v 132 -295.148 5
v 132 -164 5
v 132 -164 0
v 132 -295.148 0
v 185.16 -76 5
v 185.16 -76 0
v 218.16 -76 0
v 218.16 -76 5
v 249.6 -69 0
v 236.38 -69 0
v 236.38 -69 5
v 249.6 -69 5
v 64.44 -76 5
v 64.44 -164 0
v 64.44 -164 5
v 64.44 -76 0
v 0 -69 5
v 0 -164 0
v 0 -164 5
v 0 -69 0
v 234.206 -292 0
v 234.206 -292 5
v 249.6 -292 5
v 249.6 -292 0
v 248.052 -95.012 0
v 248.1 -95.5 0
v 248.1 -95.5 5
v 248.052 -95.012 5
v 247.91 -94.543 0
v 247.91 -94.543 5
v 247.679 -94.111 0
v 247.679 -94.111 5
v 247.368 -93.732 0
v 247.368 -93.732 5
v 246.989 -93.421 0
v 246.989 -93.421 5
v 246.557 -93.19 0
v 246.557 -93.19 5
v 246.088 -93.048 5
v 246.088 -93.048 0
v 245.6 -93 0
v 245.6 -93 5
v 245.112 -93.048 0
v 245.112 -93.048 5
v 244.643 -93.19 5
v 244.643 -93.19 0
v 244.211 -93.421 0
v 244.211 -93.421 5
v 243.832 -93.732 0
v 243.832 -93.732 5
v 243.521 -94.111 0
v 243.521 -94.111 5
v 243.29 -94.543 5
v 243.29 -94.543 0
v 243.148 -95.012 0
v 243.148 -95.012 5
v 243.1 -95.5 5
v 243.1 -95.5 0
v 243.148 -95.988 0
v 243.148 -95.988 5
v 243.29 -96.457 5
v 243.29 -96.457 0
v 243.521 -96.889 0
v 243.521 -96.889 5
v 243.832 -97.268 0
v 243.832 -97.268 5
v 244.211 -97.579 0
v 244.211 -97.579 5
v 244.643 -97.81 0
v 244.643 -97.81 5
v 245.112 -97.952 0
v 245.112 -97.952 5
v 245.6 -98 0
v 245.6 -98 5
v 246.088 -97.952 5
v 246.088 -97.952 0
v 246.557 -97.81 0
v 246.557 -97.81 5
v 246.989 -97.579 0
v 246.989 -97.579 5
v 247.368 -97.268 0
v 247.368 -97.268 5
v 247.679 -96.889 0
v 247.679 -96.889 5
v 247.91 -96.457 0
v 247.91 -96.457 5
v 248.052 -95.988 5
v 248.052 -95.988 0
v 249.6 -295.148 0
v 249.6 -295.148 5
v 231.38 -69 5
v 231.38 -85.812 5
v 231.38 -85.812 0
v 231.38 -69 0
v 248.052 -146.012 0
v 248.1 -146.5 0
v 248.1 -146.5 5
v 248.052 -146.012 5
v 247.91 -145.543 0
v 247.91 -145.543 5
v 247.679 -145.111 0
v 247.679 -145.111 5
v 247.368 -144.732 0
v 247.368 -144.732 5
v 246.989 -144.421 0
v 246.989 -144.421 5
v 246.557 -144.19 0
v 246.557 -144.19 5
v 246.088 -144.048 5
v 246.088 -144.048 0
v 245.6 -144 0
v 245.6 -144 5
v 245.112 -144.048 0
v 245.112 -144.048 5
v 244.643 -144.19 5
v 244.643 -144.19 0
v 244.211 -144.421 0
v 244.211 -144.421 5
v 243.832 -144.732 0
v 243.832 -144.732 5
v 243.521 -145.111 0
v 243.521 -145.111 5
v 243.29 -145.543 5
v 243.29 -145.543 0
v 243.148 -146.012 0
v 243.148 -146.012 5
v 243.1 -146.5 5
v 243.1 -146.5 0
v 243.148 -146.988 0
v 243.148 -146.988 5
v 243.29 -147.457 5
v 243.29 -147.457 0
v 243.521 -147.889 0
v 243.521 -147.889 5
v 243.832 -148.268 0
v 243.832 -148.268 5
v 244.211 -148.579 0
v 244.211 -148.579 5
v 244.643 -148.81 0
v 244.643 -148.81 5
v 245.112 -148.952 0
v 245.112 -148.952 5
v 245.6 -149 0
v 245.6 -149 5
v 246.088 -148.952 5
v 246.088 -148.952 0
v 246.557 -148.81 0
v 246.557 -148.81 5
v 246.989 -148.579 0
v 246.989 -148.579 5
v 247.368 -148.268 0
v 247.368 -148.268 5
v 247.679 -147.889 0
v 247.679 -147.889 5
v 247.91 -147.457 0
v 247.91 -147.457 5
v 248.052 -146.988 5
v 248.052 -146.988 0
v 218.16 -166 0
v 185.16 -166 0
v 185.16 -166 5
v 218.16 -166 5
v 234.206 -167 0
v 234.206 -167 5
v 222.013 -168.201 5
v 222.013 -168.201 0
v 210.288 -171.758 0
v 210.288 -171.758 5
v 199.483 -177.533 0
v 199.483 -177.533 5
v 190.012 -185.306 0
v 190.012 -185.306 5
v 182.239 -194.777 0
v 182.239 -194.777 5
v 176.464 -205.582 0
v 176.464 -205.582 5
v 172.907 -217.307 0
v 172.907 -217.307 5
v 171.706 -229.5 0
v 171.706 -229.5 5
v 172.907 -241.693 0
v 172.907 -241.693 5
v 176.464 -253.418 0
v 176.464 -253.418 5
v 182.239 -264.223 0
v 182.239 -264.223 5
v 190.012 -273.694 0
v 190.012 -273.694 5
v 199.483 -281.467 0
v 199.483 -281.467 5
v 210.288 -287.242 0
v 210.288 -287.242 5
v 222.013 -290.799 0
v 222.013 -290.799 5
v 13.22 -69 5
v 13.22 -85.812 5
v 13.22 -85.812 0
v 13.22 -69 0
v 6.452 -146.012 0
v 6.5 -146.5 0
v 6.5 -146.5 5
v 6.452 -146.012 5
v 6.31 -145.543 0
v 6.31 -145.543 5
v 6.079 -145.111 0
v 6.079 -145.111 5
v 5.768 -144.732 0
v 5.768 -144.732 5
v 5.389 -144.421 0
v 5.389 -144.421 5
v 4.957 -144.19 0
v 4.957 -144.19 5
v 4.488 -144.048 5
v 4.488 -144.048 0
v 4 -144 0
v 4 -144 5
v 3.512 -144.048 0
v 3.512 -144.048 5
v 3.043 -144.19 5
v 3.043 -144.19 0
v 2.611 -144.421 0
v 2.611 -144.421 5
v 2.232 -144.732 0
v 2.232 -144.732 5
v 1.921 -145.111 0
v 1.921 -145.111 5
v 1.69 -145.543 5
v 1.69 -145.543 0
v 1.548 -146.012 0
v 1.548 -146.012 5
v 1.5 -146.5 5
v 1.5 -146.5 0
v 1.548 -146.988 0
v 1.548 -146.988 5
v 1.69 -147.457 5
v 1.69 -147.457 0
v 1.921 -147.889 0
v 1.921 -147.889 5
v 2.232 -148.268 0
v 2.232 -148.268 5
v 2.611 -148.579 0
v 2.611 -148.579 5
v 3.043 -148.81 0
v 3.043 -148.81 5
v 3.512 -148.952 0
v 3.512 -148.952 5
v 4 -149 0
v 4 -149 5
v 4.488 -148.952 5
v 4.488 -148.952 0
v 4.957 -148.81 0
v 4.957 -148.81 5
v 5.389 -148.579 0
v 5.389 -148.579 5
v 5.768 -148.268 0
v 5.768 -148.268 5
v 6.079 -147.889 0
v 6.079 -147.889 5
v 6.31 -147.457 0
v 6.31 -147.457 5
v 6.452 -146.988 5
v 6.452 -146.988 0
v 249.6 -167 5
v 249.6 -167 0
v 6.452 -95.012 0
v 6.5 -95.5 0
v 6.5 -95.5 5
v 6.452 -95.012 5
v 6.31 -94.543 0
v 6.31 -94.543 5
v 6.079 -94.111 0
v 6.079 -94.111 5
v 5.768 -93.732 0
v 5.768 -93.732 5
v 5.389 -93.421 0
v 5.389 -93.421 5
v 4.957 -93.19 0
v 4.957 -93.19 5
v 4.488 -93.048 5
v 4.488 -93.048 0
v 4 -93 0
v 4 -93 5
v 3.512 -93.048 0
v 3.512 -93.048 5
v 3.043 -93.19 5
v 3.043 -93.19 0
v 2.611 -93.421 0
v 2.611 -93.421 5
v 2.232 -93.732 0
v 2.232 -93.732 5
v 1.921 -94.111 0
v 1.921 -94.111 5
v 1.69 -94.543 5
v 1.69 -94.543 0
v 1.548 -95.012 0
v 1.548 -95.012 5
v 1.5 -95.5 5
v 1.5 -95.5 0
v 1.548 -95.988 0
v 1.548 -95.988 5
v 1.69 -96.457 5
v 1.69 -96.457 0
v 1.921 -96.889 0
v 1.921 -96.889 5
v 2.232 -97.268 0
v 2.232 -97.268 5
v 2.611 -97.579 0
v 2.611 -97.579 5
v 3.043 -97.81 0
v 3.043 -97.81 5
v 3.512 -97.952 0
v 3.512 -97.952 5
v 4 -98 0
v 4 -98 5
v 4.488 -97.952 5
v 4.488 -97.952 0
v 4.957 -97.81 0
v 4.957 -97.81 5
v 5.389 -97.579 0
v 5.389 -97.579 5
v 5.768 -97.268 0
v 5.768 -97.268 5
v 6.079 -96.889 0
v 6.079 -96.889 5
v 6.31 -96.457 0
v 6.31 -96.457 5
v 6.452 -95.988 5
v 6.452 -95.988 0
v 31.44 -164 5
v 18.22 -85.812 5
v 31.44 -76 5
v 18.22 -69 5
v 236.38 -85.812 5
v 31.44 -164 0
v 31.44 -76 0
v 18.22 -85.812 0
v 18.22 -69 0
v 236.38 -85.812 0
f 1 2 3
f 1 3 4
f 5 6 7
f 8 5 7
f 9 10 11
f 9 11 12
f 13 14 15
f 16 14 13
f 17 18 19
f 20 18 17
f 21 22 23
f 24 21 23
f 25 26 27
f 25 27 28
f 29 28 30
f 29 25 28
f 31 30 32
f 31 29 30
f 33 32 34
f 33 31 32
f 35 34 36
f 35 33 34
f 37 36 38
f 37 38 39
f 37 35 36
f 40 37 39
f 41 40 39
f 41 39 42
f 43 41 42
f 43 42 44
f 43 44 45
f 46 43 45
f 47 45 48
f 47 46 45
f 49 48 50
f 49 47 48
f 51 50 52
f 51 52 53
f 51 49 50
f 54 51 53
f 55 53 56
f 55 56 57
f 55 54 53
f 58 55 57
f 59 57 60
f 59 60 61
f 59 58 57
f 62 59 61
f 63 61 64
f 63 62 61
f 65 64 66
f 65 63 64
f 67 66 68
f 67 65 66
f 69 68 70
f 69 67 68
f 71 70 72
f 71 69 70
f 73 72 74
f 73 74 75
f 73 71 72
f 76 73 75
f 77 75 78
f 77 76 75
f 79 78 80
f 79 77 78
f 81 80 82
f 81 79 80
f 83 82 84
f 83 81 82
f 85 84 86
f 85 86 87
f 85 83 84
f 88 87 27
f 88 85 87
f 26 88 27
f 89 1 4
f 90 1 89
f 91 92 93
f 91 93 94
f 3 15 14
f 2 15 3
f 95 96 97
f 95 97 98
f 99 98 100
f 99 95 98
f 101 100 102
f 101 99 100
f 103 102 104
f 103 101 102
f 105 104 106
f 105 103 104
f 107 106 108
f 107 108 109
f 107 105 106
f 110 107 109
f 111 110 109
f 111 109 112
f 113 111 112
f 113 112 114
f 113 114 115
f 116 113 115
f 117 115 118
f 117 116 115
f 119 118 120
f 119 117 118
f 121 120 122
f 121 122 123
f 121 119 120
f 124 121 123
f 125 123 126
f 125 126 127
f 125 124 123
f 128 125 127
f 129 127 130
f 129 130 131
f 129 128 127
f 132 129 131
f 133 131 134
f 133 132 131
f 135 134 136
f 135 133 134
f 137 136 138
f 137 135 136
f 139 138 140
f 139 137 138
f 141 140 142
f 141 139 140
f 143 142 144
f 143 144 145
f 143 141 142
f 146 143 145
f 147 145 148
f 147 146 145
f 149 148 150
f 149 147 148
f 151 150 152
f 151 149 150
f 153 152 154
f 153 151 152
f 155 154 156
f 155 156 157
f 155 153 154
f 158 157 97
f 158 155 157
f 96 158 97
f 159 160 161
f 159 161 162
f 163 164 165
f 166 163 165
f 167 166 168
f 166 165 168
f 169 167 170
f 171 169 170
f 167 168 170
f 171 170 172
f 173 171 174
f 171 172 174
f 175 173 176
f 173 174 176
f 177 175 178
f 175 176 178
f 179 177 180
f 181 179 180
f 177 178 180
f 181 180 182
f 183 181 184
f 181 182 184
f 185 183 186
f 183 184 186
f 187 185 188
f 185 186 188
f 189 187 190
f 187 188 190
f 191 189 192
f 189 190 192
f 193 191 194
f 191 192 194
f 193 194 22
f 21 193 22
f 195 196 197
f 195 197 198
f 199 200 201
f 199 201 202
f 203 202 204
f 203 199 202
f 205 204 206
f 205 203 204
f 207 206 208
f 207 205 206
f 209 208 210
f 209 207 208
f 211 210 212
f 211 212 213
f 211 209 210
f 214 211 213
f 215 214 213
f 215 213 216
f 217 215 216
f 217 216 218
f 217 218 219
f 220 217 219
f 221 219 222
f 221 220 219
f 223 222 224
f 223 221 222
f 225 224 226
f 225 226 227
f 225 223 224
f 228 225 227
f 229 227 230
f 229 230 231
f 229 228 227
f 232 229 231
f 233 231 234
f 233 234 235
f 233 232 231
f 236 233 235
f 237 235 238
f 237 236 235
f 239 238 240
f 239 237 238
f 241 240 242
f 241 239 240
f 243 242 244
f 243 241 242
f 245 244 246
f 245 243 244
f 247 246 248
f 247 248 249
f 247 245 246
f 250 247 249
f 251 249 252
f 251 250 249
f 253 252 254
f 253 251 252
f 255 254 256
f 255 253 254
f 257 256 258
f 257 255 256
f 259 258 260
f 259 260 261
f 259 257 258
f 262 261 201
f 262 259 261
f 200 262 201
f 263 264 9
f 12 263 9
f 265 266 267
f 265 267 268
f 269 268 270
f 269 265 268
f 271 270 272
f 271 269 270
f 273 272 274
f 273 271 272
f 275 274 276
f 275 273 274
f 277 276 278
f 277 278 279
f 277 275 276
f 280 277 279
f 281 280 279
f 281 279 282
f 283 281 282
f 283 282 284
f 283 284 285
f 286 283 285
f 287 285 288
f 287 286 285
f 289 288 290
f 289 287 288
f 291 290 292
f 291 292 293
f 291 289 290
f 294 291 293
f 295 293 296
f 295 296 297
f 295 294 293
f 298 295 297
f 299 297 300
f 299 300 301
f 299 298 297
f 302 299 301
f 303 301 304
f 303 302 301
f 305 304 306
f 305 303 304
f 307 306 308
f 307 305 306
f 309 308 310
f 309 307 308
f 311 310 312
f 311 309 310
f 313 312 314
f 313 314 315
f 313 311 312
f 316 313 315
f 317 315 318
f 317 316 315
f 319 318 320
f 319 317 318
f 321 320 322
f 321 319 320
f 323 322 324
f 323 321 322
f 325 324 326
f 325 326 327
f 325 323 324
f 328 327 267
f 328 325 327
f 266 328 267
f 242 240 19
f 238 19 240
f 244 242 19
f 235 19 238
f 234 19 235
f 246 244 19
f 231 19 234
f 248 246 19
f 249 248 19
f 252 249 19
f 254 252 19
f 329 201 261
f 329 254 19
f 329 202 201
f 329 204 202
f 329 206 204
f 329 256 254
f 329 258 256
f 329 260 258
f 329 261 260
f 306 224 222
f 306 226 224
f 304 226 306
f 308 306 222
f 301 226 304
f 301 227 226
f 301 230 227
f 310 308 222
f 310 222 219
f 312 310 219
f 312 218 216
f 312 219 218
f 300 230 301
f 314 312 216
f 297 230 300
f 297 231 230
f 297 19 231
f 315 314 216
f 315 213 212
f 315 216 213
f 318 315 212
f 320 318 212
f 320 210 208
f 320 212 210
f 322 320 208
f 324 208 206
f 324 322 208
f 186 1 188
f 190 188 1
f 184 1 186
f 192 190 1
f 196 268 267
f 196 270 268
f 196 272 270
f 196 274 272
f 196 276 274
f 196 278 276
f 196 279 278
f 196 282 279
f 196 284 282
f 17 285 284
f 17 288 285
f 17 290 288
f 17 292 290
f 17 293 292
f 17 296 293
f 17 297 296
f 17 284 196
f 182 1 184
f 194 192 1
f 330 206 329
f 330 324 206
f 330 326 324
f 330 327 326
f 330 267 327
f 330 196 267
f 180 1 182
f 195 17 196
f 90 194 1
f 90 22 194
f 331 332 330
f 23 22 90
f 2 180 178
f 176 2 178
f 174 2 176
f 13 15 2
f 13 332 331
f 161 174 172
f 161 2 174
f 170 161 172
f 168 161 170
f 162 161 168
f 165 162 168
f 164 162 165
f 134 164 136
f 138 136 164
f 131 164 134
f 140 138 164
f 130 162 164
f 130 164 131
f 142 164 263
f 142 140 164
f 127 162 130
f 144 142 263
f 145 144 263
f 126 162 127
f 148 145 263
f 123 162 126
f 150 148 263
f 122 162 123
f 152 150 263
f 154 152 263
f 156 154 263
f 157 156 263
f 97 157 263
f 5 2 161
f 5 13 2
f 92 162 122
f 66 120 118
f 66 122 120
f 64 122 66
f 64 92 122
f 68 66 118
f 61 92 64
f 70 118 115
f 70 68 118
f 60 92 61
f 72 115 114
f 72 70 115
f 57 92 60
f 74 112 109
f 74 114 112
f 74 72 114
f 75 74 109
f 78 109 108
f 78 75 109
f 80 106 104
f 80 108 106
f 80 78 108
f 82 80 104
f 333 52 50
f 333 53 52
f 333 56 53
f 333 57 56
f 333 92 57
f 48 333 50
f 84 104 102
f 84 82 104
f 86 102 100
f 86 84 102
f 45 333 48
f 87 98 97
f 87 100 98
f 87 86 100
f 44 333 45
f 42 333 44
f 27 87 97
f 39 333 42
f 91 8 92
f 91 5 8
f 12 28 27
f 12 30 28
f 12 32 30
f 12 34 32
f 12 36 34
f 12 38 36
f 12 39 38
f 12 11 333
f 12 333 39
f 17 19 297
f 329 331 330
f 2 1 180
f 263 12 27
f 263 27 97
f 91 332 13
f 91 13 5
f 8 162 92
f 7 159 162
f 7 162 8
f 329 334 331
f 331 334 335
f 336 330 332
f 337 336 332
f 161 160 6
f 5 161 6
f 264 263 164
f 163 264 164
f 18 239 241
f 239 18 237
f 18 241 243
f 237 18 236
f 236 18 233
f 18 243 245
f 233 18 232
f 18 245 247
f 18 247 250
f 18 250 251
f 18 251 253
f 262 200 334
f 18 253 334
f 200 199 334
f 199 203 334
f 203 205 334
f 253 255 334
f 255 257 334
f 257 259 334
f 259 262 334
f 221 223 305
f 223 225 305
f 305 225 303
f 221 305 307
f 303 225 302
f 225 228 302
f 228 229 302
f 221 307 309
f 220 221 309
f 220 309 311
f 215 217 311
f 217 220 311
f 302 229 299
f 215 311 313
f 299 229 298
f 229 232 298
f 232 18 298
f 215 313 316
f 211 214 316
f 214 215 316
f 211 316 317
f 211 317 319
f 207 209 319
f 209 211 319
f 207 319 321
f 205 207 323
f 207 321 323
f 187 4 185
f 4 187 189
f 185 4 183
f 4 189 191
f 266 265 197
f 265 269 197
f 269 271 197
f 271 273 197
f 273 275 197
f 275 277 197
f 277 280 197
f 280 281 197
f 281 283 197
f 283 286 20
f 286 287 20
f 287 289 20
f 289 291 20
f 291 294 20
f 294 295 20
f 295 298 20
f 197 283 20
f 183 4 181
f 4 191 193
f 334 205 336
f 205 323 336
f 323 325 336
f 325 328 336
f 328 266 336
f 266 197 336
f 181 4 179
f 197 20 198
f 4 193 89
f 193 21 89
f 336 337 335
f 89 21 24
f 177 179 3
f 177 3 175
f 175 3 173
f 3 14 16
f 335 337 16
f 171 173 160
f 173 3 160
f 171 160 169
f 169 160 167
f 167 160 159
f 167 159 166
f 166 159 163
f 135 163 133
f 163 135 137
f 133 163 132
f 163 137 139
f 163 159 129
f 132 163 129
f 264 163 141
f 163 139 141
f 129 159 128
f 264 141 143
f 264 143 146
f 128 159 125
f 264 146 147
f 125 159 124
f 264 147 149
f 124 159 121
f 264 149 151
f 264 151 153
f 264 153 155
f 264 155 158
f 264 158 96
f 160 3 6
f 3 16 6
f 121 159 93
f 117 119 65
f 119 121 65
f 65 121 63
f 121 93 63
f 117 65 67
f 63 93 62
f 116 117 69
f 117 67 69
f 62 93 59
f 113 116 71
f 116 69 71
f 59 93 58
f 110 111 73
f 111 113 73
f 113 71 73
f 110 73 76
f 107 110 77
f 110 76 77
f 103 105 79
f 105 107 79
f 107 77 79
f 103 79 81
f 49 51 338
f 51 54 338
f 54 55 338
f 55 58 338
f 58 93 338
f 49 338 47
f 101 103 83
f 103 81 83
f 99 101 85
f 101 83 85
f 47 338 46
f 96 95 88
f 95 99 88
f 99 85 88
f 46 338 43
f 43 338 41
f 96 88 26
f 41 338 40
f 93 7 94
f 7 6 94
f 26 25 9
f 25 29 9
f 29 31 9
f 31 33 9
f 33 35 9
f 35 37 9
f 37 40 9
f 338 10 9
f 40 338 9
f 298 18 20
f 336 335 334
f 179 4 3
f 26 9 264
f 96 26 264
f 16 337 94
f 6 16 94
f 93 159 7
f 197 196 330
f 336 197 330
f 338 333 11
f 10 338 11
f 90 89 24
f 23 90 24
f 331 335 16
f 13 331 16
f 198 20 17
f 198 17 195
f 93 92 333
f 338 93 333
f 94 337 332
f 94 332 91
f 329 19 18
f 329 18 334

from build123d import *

# Parameters (mm, degrees)
SKETCH1_W           = 249.6
SKETCH1_H           = 267.4
SKETCH1_R           = 2.5
SKETCH1_W_2         = 33
SKETCH1_H_2         = 90
BOSS_EXTRUDE1_DEPTH = 5
CUT_EXTRUDE4_DEPTH  = 6
SKETCH7_W           = 5
SKETCH7_H           = 20
SKETCH7_H_2         = 25
CUT_EXTRUDE5_DEPTH  = 6


with BuildPart() as part:
    # Sketch1 → Boss-Extrude1 (new body)
    with BuildSketch(Plane.XY):
        with Locations((124.8, -202.7)):
            Rectangle(SKETCH1_W, SKETCH1_H)
        with Locations((245.6, -95.5)):
            Circle(SKETCH1_R, mode=Mode.SUBTRACT)
        with Locations((245.6, -146.5)):
            Circle(SKETCH1_R, mode=Mode.SUBTRACT)
        with Locations((4, -146.5)):
            Circle(SKETCH1_R, mode=Mode.SUBTRACT)
        with Locations((4, -95.5)):
            Circle(SKETCH1_R, mode=Mode.SUBTRACT)
        with Locations((201.66, -121)):
            Rectangle(SKETCH1_W_2, SKETCH1_H_2, mode=Mode.SUBTRACT)
        with Locations((47.94, -121)):
            Rectangle(SKETCH1_W_2, SKETCH1_H_2, mode=Mode.SUBTRACT)
    extrude(amount=BOSS_EXTRUDE1_DEPTH)

    # Sketch6 → Cut-Extrude4 (cut, through all)
    with BuildSketch(Plane.XY.offset(5)):
        Polygon((132, -295.148008477), (249.6, -295.148008477), (249.6, -336.4), (0, -336.4), (0, -227), (0, -164), (132, -164), align=None)
        with BuildLine():
            Line((234.205987928, -292), (296.705987928, -292))
            Line((296.705987928, -292), (296.705987928, -167))
            Line((296.705987928, -167), (234.205987928, -167))
            ThreePointArc((234.205987928, -167), (171.705987928, -229.5), (234.205987928, -292))
        make_face()
    extrude(amount=-CUT_EXTRUDE4_DEPTH, mode=Mode.SUBTRACT)

    # Sketch7 → Cut-Extrude5 (cut, through all)
    with BuildSketch(Plane.XY.offset(5)):
        with Locations((15.72, -30.8123203)):
            Rectangle(SKETCH7_W, SKETCH7_H)
        with Locations((233.88, -30.8123203)):
            Rectangle(SKETCH7_W, SKETCH7_H)
        with Locations((15.72, -73.3123203)):
            Rectangle(SKETCH7_W, SKETCH7_H_2)
        with Locations((233.88, -73.3123203)):
            Rectangle(SKETCH7_W, SKETCH7_H_2)
    extrude(amount=-CUT_EXTRUDE5_DEPTH, mode=Mode.SUBTRACT)


solid = part.part
